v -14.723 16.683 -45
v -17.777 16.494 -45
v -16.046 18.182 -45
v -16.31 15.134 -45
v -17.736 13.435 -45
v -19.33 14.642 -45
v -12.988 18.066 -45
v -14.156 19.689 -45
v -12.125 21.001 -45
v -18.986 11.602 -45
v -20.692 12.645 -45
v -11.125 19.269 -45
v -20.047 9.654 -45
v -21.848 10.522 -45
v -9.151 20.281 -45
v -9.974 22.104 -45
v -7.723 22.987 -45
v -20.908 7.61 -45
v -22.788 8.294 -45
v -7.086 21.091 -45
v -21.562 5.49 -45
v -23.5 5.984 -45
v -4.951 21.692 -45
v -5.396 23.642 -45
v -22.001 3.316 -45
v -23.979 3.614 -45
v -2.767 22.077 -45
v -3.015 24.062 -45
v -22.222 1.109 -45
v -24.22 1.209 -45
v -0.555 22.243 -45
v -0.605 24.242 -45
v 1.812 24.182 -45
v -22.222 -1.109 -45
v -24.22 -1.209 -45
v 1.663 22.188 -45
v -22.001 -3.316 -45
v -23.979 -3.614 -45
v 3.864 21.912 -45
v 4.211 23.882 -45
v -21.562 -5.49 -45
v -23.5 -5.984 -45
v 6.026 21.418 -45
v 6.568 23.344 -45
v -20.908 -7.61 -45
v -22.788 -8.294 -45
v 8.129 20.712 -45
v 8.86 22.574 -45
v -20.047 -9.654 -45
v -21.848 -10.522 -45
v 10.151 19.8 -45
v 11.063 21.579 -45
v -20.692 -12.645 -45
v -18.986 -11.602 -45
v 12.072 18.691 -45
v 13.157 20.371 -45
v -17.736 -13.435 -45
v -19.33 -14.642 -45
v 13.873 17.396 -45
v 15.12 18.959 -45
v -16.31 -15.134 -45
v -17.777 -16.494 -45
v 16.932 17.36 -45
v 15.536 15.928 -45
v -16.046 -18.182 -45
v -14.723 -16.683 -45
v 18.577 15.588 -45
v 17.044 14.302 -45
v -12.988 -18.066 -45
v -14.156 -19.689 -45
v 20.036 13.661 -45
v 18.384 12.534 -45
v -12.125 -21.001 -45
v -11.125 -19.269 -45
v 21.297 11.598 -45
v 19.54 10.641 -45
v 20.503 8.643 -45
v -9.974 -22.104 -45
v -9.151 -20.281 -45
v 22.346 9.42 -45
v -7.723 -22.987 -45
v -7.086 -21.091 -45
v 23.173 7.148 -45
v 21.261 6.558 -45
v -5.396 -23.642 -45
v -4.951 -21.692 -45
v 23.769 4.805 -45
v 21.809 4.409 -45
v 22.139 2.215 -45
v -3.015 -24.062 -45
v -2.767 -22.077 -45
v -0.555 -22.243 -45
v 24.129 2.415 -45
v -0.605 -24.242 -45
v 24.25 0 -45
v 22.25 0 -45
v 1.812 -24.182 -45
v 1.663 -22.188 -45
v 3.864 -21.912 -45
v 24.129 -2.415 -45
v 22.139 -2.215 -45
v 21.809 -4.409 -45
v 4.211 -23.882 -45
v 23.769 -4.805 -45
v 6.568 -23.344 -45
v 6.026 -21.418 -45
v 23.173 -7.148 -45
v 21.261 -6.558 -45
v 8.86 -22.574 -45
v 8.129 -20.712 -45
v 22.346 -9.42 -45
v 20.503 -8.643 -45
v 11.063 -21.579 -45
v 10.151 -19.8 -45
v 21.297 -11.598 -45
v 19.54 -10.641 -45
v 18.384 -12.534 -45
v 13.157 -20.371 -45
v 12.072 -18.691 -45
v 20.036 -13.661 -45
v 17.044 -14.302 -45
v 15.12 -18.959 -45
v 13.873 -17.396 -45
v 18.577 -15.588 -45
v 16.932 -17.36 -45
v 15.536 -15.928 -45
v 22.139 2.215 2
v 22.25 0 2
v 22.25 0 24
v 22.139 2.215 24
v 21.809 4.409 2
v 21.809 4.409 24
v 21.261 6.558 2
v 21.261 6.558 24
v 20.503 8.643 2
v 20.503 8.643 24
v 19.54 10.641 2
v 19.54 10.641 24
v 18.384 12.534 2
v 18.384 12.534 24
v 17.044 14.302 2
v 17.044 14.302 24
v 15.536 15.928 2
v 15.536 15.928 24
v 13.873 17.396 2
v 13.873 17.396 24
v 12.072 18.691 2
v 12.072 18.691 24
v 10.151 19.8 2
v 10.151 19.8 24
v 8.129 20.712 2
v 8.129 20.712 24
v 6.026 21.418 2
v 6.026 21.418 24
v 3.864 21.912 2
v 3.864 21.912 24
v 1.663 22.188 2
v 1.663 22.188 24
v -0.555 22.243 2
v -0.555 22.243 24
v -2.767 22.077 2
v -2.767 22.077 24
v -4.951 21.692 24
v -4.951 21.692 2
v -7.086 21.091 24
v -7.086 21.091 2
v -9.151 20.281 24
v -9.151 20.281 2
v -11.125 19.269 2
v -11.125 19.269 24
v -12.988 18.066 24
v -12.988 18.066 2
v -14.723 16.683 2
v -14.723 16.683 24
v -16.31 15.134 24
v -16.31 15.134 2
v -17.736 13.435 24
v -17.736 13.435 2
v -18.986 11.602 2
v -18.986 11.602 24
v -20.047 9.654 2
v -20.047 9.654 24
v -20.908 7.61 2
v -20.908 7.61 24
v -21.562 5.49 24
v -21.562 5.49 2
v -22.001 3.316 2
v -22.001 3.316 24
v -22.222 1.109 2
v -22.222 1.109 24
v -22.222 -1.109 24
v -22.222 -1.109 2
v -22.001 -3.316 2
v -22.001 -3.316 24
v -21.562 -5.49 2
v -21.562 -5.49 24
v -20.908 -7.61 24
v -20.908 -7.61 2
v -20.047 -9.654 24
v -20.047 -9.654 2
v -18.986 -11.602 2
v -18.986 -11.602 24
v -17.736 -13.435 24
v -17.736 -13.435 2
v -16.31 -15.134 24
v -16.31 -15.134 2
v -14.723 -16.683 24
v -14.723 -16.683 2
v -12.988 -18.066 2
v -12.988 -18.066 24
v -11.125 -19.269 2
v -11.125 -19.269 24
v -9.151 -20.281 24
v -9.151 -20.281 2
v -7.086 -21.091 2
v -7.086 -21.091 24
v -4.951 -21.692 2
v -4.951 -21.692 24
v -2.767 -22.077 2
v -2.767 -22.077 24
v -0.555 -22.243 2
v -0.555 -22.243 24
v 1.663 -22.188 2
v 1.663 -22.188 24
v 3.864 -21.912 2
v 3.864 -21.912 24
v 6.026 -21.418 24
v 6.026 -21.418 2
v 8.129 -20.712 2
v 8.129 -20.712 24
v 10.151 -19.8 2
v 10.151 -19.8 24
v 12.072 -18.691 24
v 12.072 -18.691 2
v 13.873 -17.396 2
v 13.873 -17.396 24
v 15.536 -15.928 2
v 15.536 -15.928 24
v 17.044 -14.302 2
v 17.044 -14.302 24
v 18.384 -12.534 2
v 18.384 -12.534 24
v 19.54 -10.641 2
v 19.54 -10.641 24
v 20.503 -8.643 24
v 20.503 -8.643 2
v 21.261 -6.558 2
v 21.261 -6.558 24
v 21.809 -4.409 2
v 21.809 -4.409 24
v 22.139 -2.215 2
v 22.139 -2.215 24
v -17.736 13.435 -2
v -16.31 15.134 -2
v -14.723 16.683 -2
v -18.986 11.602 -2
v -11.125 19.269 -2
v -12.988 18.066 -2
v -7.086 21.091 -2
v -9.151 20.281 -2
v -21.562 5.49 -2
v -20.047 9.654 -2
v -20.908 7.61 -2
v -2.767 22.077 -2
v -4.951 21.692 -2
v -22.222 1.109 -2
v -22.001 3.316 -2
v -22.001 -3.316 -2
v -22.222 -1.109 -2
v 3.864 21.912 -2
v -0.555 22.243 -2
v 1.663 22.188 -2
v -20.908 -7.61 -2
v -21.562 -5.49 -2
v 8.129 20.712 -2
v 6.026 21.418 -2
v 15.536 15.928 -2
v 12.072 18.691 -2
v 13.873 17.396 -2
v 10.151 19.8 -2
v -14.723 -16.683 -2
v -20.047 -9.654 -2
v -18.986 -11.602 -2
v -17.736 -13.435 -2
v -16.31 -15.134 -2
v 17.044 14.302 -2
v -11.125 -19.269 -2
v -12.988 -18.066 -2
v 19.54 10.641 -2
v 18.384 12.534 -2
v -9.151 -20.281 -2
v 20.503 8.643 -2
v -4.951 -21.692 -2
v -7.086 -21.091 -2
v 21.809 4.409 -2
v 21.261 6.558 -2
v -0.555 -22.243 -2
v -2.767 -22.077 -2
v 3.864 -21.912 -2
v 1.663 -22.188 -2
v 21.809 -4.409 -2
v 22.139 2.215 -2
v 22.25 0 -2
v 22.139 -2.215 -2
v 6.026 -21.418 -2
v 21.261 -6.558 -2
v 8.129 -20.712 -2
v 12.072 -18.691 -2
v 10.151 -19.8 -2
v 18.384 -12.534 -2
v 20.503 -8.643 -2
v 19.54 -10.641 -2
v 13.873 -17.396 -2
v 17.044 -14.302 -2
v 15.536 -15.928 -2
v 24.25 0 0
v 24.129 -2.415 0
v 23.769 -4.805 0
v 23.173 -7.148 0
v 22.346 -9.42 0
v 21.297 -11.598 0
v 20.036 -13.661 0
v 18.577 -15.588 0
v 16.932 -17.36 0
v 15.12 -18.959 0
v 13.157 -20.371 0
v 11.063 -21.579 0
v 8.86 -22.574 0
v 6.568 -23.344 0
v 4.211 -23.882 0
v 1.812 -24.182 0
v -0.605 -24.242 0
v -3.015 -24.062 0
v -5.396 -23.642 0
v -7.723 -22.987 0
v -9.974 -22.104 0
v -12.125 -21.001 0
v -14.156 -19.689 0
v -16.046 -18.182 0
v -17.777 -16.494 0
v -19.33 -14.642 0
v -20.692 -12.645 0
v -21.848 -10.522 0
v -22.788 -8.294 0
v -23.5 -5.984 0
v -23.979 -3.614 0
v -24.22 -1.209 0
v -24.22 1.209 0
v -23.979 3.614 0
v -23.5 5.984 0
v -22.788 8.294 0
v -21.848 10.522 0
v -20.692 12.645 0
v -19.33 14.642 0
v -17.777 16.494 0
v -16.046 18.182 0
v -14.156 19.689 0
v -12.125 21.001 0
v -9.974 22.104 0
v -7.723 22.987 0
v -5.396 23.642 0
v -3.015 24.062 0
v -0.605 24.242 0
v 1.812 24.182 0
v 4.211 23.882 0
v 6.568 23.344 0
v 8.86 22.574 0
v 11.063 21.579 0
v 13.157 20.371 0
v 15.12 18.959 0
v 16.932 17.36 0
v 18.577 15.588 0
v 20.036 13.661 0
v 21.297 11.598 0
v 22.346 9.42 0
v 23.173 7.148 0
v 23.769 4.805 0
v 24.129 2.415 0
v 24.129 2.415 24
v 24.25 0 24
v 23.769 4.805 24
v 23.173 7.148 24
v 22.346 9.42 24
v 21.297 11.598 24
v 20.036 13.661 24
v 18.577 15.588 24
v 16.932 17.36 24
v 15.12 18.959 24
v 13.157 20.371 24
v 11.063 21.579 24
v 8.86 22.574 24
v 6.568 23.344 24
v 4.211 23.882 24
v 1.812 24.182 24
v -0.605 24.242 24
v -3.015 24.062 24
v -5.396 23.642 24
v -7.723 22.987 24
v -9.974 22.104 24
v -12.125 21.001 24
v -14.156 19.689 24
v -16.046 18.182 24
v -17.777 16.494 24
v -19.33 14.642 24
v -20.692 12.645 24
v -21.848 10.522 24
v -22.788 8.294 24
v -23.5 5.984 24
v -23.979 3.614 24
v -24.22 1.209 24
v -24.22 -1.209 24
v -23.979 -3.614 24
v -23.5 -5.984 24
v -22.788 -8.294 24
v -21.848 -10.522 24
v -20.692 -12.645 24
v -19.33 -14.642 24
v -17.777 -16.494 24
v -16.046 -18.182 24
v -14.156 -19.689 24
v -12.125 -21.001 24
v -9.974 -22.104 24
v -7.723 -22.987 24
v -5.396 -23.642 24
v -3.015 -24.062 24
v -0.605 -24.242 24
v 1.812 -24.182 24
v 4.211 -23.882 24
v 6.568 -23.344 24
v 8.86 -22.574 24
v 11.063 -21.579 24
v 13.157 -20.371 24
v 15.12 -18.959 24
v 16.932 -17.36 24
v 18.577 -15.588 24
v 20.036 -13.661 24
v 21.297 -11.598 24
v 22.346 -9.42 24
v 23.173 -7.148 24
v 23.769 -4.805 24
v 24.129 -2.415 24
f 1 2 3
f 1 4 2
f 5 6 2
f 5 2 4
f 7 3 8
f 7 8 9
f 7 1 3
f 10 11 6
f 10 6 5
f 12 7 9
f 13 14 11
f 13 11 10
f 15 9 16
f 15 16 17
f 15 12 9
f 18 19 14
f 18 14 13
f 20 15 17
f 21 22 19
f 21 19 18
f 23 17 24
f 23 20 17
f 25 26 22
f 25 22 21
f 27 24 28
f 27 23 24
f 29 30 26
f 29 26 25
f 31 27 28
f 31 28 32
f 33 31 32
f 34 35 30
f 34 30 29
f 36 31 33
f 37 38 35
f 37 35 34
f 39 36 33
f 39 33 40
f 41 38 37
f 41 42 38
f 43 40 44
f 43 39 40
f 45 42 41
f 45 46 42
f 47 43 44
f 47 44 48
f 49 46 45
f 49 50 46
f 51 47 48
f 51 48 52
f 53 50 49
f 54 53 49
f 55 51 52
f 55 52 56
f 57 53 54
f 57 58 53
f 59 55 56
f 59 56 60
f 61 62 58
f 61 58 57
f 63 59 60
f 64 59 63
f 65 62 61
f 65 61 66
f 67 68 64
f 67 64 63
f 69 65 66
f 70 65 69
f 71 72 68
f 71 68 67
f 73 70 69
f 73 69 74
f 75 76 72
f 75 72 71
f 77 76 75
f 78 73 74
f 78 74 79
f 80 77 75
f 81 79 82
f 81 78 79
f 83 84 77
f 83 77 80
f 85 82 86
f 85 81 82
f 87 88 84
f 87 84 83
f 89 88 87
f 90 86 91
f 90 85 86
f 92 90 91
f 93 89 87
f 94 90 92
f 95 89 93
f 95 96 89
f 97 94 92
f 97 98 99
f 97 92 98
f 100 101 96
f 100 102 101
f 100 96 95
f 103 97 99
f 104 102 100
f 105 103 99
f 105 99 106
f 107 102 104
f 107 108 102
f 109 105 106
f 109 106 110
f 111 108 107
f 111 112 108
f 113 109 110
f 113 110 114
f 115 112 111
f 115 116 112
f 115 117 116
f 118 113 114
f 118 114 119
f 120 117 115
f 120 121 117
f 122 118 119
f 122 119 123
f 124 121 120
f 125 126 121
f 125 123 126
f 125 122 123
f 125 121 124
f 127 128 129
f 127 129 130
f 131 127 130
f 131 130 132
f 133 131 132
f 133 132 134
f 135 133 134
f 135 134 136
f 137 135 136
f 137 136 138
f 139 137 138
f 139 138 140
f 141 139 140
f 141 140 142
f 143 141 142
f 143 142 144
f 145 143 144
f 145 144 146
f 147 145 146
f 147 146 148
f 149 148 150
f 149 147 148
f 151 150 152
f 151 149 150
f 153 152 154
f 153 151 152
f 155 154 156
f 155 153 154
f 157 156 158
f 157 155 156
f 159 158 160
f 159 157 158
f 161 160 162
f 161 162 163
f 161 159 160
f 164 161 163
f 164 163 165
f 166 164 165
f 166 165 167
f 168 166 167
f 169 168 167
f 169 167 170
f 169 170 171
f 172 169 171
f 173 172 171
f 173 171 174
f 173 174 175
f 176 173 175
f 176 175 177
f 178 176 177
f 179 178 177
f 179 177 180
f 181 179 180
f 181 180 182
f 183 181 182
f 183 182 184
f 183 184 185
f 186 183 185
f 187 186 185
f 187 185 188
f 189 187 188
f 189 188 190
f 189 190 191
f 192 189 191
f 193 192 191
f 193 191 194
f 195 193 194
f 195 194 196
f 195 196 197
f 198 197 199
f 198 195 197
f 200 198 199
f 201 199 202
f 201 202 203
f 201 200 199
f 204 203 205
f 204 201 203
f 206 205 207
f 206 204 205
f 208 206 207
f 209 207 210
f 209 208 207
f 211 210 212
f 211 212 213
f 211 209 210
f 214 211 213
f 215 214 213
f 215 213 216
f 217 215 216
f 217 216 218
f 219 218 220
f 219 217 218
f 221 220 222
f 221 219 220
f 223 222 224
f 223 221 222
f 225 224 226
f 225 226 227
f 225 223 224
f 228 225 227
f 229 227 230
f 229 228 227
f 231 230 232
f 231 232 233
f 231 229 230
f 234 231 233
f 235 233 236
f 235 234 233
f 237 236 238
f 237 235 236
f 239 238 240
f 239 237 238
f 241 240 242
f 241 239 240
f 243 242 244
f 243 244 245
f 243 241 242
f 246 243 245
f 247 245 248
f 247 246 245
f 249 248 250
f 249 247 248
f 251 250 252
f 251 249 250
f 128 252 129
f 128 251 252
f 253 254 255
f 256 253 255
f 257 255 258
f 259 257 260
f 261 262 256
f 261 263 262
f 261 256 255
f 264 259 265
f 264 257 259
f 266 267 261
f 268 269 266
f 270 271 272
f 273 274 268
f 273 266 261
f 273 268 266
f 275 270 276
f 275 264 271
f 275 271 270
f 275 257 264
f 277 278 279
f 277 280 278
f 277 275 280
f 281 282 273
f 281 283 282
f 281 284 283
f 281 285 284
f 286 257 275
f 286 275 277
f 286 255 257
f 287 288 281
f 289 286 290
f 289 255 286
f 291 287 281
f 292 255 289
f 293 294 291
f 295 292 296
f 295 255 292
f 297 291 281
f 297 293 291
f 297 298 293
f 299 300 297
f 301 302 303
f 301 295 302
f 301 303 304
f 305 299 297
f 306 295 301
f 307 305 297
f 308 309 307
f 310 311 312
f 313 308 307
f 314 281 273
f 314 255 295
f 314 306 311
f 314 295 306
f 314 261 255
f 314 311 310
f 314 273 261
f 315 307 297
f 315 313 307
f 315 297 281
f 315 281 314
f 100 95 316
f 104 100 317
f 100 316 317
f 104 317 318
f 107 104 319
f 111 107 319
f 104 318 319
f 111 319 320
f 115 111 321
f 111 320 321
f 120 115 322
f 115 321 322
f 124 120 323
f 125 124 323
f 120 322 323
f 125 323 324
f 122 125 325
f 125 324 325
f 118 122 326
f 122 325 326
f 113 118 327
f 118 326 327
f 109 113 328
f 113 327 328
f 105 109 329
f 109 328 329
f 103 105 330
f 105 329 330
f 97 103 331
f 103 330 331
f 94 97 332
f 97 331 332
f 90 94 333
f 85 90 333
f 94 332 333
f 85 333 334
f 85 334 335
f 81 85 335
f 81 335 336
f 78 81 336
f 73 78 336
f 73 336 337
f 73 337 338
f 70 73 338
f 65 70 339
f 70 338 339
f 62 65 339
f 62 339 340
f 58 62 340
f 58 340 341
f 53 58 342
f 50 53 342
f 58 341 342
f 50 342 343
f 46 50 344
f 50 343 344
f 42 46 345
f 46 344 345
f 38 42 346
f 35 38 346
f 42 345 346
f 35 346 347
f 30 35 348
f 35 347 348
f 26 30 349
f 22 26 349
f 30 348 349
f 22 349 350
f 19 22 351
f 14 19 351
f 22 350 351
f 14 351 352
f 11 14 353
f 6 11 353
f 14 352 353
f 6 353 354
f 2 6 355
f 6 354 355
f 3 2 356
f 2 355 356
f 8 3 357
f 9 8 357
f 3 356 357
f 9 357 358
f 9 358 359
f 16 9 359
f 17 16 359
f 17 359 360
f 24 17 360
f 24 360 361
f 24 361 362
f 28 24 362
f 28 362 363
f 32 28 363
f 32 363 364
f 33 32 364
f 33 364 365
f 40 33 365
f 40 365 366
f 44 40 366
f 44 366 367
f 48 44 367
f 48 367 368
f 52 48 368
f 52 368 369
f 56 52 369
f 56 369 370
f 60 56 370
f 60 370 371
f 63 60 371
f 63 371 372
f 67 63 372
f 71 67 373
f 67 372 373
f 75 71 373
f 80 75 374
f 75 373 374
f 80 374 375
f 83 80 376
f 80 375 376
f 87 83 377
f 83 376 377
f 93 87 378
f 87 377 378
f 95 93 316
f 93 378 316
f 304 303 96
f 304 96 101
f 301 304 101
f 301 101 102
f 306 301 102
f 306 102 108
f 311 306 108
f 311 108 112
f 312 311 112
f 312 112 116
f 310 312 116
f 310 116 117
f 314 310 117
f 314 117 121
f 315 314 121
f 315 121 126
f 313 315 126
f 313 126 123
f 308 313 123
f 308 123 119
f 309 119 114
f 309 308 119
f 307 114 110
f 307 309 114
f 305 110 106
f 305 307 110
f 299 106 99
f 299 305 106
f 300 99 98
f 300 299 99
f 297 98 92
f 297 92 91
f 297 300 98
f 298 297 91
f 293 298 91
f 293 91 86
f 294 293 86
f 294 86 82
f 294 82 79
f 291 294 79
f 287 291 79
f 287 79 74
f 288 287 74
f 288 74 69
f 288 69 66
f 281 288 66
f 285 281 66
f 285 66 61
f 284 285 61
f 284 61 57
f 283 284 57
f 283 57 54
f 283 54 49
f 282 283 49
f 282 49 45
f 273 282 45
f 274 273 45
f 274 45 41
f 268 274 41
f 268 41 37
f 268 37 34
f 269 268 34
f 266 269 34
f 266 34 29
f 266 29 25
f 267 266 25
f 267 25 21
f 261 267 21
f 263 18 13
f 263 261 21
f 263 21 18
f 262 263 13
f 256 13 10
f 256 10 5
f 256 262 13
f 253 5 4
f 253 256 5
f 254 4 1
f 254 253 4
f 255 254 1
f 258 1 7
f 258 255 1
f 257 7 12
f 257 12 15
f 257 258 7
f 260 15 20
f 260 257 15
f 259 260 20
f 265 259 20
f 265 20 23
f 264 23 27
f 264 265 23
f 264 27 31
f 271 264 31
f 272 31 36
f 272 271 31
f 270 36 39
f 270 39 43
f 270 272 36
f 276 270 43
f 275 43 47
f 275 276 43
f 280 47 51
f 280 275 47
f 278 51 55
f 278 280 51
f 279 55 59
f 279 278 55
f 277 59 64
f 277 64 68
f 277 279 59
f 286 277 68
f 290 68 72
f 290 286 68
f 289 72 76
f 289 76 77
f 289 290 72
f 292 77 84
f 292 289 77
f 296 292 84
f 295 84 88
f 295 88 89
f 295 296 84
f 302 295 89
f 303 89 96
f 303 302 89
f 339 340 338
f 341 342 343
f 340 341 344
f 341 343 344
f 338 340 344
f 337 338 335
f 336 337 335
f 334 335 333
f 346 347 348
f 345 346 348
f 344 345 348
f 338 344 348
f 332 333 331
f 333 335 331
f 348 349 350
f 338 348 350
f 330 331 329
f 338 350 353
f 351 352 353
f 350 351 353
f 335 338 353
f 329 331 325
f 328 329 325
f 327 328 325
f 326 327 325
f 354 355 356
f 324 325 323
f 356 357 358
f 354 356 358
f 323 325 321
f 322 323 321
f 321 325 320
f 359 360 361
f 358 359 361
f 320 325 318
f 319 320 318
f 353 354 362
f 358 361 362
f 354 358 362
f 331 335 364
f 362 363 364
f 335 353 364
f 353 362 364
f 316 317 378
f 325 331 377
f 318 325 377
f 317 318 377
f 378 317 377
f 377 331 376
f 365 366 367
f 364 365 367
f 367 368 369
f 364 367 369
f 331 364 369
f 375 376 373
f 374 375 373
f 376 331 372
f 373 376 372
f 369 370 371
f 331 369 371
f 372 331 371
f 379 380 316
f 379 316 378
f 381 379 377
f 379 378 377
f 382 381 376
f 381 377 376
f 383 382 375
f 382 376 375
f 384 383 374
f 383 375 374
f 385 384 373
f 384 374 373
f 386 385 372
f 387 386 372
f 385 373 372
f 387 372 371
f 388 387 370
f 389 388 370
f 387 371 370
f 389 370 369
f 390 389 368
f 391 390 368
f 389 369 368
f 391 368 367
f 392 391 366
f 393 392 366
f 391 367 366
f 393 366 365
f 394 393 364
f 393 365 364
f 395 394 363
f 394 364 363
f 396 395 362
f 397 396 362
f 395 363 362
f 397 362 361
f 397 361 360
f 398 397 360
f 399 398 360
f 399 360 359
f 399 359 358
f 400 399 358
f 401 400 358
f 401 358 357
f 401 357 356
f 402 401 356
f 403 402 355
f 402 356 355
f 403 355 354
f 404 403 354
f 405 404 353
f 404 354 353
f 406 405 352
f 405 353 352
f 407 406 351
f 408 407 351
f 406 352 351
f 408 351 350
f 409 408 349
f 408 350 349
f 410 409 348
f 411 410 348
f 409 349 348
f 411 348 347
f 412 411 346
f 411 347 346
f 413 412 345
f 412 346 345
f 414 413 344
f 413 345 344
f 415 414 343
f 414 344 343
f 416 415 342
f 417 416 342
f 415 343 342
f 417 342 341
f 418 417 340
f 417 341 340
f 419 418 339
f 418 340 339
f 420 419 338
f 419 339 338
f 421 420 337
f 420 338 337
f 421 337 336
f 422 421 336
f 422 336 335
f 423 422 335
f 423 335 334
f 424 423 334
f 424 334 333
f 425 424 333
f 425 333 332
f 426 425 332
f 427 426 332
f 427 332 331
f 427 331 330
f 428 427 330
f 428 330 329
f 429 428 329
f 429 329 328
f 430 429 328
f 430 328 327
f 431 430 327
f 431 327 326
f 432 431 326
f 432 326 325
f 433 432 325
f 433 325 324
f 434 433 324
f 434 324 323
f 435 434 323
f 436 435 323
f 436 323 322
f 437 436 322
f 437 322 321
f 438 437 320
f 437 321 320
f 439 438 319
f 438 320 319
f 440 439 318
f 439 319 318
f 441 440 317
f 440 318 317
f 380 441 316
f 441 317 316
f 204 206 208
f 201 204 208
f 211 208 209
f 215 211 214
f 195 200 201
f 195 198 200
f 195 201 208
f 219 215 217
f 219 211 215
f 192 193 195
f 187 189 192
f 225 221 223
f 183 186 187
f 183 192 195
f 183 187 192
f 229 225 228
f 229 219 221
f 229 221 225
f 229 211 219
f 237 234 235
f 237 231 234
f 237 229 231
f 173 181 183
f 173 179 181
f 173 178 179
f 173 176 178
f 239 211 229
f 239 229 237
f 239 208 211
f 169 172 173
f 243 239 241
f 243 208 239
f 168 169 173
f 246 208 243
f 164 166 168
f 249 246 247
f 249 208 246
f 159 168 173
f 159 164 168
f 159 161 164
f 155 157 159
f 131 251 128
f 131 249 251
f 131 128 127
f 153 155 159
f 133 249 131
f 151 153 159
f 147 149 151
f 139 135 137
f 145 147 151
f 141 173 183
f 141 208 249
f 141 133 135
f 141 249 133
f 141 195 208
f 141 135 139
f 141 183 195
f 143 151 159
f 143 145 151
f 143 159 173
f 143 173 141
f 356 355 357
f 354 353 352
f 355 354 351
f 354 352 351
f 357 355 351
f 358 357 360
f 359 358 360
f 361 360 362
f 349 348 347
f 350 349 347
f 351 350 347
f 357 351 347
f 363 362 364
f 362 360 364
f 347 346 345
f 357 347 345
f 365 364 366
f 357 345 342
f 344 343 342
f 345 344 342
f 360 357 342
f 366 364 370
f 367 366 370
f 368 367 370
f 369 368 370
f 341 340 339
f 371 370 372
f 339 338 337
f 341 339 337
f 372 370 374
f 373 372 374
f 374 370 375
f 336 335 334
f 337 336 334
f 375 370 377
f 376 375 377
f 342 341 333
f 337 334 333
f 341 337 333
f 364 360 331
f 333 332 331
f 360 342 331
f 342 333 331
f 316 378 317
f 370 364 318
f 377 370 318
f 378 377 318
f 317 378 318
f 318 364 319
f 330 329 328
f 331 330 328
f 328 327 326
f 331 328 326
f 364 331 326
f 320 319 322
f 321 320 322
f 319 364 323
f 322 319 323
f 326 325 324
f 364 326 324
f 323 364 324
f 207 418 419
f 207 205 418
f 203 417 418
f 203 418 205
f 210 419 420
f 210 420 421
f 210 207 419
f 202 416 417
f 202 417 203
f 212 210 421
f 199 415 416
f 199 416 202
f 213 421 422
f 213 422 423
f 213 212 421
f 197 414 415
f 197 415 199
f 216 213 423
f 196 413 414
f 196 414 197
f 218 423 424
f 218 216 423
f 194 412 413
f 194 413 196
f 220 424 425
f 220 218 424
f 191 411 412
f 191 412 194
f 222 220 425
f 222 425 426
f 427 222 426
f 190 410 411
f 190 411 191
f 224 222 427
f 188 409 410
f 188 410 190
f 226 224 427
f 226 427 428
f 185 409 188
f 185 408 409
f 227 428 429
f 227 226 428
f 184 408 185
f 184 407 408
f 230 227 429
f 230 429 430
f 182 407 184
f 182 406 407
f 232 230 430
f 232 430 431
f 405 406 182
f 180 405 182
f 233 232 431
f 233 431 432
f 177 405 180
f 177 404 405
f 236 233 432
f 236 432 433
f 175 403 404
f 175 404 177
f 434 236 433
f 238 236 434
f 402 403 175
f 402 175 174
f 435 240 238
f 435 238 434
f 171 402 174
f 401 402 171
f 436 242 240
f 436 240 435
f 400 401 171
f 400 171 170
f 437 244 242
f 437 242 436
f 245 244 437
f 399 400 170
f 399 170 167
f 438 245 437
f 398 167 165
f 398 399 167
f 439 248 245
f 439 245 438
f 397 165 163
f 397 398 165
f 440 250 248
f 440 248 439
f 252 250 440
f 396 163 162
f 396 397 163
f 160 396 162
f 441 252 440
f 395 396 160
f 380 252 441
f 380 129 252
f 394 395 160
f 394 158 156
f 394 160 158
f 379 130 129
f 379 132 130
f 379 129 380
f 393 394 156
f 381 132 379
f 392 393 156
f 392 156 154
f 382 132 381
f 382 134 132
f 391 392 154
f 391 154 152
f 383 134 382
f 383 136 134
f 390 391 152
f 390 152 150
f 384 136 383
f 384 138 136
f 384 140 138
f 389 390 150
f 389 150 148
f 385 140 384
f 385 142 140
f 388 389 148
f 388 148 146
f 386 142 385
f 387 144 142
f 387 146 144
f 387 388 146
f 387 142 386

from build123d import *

# Parameters (mm, degrees)
F0_R     = 24.25
F1_DEPTH = 24
F2_T     = -2
F3_R     = 24.25
F4_DEPTH = 45
F5_T     = -2


with BuildPart() as f1:
    # F0 (on Top) → F1 (new body)
    with BuildSketch(Plane.XY):
        Circle(F0_R)
    extrude(amount=F1_DEPTH)

    # F2
    f2_openings = [f1.faces().sort_by_distance(p)[0] for p in [
        (0, 0, 24),
    ]]
    offset(amount=F2_T, openings=f2_openings)


with BuildPart() as f4:
    # F3 (on face) → F4 (new body)
    with BuildSketch(Plane(origin=(0, 0, 0), x_dir=(1, 0, 0), z_dir=(0, 0, -1))):
        Circle(F3_R)
    extrude(amount=F4_DEPTH)

    # F5
    f5_openings = [f4.faces().sort_by_distance(p)[0] for p in [
        (0, 0, -45),
    ]]
    offset(amount=F5_T, openings=f5_openings)


solid = Compound([f1.part, f4.part])
